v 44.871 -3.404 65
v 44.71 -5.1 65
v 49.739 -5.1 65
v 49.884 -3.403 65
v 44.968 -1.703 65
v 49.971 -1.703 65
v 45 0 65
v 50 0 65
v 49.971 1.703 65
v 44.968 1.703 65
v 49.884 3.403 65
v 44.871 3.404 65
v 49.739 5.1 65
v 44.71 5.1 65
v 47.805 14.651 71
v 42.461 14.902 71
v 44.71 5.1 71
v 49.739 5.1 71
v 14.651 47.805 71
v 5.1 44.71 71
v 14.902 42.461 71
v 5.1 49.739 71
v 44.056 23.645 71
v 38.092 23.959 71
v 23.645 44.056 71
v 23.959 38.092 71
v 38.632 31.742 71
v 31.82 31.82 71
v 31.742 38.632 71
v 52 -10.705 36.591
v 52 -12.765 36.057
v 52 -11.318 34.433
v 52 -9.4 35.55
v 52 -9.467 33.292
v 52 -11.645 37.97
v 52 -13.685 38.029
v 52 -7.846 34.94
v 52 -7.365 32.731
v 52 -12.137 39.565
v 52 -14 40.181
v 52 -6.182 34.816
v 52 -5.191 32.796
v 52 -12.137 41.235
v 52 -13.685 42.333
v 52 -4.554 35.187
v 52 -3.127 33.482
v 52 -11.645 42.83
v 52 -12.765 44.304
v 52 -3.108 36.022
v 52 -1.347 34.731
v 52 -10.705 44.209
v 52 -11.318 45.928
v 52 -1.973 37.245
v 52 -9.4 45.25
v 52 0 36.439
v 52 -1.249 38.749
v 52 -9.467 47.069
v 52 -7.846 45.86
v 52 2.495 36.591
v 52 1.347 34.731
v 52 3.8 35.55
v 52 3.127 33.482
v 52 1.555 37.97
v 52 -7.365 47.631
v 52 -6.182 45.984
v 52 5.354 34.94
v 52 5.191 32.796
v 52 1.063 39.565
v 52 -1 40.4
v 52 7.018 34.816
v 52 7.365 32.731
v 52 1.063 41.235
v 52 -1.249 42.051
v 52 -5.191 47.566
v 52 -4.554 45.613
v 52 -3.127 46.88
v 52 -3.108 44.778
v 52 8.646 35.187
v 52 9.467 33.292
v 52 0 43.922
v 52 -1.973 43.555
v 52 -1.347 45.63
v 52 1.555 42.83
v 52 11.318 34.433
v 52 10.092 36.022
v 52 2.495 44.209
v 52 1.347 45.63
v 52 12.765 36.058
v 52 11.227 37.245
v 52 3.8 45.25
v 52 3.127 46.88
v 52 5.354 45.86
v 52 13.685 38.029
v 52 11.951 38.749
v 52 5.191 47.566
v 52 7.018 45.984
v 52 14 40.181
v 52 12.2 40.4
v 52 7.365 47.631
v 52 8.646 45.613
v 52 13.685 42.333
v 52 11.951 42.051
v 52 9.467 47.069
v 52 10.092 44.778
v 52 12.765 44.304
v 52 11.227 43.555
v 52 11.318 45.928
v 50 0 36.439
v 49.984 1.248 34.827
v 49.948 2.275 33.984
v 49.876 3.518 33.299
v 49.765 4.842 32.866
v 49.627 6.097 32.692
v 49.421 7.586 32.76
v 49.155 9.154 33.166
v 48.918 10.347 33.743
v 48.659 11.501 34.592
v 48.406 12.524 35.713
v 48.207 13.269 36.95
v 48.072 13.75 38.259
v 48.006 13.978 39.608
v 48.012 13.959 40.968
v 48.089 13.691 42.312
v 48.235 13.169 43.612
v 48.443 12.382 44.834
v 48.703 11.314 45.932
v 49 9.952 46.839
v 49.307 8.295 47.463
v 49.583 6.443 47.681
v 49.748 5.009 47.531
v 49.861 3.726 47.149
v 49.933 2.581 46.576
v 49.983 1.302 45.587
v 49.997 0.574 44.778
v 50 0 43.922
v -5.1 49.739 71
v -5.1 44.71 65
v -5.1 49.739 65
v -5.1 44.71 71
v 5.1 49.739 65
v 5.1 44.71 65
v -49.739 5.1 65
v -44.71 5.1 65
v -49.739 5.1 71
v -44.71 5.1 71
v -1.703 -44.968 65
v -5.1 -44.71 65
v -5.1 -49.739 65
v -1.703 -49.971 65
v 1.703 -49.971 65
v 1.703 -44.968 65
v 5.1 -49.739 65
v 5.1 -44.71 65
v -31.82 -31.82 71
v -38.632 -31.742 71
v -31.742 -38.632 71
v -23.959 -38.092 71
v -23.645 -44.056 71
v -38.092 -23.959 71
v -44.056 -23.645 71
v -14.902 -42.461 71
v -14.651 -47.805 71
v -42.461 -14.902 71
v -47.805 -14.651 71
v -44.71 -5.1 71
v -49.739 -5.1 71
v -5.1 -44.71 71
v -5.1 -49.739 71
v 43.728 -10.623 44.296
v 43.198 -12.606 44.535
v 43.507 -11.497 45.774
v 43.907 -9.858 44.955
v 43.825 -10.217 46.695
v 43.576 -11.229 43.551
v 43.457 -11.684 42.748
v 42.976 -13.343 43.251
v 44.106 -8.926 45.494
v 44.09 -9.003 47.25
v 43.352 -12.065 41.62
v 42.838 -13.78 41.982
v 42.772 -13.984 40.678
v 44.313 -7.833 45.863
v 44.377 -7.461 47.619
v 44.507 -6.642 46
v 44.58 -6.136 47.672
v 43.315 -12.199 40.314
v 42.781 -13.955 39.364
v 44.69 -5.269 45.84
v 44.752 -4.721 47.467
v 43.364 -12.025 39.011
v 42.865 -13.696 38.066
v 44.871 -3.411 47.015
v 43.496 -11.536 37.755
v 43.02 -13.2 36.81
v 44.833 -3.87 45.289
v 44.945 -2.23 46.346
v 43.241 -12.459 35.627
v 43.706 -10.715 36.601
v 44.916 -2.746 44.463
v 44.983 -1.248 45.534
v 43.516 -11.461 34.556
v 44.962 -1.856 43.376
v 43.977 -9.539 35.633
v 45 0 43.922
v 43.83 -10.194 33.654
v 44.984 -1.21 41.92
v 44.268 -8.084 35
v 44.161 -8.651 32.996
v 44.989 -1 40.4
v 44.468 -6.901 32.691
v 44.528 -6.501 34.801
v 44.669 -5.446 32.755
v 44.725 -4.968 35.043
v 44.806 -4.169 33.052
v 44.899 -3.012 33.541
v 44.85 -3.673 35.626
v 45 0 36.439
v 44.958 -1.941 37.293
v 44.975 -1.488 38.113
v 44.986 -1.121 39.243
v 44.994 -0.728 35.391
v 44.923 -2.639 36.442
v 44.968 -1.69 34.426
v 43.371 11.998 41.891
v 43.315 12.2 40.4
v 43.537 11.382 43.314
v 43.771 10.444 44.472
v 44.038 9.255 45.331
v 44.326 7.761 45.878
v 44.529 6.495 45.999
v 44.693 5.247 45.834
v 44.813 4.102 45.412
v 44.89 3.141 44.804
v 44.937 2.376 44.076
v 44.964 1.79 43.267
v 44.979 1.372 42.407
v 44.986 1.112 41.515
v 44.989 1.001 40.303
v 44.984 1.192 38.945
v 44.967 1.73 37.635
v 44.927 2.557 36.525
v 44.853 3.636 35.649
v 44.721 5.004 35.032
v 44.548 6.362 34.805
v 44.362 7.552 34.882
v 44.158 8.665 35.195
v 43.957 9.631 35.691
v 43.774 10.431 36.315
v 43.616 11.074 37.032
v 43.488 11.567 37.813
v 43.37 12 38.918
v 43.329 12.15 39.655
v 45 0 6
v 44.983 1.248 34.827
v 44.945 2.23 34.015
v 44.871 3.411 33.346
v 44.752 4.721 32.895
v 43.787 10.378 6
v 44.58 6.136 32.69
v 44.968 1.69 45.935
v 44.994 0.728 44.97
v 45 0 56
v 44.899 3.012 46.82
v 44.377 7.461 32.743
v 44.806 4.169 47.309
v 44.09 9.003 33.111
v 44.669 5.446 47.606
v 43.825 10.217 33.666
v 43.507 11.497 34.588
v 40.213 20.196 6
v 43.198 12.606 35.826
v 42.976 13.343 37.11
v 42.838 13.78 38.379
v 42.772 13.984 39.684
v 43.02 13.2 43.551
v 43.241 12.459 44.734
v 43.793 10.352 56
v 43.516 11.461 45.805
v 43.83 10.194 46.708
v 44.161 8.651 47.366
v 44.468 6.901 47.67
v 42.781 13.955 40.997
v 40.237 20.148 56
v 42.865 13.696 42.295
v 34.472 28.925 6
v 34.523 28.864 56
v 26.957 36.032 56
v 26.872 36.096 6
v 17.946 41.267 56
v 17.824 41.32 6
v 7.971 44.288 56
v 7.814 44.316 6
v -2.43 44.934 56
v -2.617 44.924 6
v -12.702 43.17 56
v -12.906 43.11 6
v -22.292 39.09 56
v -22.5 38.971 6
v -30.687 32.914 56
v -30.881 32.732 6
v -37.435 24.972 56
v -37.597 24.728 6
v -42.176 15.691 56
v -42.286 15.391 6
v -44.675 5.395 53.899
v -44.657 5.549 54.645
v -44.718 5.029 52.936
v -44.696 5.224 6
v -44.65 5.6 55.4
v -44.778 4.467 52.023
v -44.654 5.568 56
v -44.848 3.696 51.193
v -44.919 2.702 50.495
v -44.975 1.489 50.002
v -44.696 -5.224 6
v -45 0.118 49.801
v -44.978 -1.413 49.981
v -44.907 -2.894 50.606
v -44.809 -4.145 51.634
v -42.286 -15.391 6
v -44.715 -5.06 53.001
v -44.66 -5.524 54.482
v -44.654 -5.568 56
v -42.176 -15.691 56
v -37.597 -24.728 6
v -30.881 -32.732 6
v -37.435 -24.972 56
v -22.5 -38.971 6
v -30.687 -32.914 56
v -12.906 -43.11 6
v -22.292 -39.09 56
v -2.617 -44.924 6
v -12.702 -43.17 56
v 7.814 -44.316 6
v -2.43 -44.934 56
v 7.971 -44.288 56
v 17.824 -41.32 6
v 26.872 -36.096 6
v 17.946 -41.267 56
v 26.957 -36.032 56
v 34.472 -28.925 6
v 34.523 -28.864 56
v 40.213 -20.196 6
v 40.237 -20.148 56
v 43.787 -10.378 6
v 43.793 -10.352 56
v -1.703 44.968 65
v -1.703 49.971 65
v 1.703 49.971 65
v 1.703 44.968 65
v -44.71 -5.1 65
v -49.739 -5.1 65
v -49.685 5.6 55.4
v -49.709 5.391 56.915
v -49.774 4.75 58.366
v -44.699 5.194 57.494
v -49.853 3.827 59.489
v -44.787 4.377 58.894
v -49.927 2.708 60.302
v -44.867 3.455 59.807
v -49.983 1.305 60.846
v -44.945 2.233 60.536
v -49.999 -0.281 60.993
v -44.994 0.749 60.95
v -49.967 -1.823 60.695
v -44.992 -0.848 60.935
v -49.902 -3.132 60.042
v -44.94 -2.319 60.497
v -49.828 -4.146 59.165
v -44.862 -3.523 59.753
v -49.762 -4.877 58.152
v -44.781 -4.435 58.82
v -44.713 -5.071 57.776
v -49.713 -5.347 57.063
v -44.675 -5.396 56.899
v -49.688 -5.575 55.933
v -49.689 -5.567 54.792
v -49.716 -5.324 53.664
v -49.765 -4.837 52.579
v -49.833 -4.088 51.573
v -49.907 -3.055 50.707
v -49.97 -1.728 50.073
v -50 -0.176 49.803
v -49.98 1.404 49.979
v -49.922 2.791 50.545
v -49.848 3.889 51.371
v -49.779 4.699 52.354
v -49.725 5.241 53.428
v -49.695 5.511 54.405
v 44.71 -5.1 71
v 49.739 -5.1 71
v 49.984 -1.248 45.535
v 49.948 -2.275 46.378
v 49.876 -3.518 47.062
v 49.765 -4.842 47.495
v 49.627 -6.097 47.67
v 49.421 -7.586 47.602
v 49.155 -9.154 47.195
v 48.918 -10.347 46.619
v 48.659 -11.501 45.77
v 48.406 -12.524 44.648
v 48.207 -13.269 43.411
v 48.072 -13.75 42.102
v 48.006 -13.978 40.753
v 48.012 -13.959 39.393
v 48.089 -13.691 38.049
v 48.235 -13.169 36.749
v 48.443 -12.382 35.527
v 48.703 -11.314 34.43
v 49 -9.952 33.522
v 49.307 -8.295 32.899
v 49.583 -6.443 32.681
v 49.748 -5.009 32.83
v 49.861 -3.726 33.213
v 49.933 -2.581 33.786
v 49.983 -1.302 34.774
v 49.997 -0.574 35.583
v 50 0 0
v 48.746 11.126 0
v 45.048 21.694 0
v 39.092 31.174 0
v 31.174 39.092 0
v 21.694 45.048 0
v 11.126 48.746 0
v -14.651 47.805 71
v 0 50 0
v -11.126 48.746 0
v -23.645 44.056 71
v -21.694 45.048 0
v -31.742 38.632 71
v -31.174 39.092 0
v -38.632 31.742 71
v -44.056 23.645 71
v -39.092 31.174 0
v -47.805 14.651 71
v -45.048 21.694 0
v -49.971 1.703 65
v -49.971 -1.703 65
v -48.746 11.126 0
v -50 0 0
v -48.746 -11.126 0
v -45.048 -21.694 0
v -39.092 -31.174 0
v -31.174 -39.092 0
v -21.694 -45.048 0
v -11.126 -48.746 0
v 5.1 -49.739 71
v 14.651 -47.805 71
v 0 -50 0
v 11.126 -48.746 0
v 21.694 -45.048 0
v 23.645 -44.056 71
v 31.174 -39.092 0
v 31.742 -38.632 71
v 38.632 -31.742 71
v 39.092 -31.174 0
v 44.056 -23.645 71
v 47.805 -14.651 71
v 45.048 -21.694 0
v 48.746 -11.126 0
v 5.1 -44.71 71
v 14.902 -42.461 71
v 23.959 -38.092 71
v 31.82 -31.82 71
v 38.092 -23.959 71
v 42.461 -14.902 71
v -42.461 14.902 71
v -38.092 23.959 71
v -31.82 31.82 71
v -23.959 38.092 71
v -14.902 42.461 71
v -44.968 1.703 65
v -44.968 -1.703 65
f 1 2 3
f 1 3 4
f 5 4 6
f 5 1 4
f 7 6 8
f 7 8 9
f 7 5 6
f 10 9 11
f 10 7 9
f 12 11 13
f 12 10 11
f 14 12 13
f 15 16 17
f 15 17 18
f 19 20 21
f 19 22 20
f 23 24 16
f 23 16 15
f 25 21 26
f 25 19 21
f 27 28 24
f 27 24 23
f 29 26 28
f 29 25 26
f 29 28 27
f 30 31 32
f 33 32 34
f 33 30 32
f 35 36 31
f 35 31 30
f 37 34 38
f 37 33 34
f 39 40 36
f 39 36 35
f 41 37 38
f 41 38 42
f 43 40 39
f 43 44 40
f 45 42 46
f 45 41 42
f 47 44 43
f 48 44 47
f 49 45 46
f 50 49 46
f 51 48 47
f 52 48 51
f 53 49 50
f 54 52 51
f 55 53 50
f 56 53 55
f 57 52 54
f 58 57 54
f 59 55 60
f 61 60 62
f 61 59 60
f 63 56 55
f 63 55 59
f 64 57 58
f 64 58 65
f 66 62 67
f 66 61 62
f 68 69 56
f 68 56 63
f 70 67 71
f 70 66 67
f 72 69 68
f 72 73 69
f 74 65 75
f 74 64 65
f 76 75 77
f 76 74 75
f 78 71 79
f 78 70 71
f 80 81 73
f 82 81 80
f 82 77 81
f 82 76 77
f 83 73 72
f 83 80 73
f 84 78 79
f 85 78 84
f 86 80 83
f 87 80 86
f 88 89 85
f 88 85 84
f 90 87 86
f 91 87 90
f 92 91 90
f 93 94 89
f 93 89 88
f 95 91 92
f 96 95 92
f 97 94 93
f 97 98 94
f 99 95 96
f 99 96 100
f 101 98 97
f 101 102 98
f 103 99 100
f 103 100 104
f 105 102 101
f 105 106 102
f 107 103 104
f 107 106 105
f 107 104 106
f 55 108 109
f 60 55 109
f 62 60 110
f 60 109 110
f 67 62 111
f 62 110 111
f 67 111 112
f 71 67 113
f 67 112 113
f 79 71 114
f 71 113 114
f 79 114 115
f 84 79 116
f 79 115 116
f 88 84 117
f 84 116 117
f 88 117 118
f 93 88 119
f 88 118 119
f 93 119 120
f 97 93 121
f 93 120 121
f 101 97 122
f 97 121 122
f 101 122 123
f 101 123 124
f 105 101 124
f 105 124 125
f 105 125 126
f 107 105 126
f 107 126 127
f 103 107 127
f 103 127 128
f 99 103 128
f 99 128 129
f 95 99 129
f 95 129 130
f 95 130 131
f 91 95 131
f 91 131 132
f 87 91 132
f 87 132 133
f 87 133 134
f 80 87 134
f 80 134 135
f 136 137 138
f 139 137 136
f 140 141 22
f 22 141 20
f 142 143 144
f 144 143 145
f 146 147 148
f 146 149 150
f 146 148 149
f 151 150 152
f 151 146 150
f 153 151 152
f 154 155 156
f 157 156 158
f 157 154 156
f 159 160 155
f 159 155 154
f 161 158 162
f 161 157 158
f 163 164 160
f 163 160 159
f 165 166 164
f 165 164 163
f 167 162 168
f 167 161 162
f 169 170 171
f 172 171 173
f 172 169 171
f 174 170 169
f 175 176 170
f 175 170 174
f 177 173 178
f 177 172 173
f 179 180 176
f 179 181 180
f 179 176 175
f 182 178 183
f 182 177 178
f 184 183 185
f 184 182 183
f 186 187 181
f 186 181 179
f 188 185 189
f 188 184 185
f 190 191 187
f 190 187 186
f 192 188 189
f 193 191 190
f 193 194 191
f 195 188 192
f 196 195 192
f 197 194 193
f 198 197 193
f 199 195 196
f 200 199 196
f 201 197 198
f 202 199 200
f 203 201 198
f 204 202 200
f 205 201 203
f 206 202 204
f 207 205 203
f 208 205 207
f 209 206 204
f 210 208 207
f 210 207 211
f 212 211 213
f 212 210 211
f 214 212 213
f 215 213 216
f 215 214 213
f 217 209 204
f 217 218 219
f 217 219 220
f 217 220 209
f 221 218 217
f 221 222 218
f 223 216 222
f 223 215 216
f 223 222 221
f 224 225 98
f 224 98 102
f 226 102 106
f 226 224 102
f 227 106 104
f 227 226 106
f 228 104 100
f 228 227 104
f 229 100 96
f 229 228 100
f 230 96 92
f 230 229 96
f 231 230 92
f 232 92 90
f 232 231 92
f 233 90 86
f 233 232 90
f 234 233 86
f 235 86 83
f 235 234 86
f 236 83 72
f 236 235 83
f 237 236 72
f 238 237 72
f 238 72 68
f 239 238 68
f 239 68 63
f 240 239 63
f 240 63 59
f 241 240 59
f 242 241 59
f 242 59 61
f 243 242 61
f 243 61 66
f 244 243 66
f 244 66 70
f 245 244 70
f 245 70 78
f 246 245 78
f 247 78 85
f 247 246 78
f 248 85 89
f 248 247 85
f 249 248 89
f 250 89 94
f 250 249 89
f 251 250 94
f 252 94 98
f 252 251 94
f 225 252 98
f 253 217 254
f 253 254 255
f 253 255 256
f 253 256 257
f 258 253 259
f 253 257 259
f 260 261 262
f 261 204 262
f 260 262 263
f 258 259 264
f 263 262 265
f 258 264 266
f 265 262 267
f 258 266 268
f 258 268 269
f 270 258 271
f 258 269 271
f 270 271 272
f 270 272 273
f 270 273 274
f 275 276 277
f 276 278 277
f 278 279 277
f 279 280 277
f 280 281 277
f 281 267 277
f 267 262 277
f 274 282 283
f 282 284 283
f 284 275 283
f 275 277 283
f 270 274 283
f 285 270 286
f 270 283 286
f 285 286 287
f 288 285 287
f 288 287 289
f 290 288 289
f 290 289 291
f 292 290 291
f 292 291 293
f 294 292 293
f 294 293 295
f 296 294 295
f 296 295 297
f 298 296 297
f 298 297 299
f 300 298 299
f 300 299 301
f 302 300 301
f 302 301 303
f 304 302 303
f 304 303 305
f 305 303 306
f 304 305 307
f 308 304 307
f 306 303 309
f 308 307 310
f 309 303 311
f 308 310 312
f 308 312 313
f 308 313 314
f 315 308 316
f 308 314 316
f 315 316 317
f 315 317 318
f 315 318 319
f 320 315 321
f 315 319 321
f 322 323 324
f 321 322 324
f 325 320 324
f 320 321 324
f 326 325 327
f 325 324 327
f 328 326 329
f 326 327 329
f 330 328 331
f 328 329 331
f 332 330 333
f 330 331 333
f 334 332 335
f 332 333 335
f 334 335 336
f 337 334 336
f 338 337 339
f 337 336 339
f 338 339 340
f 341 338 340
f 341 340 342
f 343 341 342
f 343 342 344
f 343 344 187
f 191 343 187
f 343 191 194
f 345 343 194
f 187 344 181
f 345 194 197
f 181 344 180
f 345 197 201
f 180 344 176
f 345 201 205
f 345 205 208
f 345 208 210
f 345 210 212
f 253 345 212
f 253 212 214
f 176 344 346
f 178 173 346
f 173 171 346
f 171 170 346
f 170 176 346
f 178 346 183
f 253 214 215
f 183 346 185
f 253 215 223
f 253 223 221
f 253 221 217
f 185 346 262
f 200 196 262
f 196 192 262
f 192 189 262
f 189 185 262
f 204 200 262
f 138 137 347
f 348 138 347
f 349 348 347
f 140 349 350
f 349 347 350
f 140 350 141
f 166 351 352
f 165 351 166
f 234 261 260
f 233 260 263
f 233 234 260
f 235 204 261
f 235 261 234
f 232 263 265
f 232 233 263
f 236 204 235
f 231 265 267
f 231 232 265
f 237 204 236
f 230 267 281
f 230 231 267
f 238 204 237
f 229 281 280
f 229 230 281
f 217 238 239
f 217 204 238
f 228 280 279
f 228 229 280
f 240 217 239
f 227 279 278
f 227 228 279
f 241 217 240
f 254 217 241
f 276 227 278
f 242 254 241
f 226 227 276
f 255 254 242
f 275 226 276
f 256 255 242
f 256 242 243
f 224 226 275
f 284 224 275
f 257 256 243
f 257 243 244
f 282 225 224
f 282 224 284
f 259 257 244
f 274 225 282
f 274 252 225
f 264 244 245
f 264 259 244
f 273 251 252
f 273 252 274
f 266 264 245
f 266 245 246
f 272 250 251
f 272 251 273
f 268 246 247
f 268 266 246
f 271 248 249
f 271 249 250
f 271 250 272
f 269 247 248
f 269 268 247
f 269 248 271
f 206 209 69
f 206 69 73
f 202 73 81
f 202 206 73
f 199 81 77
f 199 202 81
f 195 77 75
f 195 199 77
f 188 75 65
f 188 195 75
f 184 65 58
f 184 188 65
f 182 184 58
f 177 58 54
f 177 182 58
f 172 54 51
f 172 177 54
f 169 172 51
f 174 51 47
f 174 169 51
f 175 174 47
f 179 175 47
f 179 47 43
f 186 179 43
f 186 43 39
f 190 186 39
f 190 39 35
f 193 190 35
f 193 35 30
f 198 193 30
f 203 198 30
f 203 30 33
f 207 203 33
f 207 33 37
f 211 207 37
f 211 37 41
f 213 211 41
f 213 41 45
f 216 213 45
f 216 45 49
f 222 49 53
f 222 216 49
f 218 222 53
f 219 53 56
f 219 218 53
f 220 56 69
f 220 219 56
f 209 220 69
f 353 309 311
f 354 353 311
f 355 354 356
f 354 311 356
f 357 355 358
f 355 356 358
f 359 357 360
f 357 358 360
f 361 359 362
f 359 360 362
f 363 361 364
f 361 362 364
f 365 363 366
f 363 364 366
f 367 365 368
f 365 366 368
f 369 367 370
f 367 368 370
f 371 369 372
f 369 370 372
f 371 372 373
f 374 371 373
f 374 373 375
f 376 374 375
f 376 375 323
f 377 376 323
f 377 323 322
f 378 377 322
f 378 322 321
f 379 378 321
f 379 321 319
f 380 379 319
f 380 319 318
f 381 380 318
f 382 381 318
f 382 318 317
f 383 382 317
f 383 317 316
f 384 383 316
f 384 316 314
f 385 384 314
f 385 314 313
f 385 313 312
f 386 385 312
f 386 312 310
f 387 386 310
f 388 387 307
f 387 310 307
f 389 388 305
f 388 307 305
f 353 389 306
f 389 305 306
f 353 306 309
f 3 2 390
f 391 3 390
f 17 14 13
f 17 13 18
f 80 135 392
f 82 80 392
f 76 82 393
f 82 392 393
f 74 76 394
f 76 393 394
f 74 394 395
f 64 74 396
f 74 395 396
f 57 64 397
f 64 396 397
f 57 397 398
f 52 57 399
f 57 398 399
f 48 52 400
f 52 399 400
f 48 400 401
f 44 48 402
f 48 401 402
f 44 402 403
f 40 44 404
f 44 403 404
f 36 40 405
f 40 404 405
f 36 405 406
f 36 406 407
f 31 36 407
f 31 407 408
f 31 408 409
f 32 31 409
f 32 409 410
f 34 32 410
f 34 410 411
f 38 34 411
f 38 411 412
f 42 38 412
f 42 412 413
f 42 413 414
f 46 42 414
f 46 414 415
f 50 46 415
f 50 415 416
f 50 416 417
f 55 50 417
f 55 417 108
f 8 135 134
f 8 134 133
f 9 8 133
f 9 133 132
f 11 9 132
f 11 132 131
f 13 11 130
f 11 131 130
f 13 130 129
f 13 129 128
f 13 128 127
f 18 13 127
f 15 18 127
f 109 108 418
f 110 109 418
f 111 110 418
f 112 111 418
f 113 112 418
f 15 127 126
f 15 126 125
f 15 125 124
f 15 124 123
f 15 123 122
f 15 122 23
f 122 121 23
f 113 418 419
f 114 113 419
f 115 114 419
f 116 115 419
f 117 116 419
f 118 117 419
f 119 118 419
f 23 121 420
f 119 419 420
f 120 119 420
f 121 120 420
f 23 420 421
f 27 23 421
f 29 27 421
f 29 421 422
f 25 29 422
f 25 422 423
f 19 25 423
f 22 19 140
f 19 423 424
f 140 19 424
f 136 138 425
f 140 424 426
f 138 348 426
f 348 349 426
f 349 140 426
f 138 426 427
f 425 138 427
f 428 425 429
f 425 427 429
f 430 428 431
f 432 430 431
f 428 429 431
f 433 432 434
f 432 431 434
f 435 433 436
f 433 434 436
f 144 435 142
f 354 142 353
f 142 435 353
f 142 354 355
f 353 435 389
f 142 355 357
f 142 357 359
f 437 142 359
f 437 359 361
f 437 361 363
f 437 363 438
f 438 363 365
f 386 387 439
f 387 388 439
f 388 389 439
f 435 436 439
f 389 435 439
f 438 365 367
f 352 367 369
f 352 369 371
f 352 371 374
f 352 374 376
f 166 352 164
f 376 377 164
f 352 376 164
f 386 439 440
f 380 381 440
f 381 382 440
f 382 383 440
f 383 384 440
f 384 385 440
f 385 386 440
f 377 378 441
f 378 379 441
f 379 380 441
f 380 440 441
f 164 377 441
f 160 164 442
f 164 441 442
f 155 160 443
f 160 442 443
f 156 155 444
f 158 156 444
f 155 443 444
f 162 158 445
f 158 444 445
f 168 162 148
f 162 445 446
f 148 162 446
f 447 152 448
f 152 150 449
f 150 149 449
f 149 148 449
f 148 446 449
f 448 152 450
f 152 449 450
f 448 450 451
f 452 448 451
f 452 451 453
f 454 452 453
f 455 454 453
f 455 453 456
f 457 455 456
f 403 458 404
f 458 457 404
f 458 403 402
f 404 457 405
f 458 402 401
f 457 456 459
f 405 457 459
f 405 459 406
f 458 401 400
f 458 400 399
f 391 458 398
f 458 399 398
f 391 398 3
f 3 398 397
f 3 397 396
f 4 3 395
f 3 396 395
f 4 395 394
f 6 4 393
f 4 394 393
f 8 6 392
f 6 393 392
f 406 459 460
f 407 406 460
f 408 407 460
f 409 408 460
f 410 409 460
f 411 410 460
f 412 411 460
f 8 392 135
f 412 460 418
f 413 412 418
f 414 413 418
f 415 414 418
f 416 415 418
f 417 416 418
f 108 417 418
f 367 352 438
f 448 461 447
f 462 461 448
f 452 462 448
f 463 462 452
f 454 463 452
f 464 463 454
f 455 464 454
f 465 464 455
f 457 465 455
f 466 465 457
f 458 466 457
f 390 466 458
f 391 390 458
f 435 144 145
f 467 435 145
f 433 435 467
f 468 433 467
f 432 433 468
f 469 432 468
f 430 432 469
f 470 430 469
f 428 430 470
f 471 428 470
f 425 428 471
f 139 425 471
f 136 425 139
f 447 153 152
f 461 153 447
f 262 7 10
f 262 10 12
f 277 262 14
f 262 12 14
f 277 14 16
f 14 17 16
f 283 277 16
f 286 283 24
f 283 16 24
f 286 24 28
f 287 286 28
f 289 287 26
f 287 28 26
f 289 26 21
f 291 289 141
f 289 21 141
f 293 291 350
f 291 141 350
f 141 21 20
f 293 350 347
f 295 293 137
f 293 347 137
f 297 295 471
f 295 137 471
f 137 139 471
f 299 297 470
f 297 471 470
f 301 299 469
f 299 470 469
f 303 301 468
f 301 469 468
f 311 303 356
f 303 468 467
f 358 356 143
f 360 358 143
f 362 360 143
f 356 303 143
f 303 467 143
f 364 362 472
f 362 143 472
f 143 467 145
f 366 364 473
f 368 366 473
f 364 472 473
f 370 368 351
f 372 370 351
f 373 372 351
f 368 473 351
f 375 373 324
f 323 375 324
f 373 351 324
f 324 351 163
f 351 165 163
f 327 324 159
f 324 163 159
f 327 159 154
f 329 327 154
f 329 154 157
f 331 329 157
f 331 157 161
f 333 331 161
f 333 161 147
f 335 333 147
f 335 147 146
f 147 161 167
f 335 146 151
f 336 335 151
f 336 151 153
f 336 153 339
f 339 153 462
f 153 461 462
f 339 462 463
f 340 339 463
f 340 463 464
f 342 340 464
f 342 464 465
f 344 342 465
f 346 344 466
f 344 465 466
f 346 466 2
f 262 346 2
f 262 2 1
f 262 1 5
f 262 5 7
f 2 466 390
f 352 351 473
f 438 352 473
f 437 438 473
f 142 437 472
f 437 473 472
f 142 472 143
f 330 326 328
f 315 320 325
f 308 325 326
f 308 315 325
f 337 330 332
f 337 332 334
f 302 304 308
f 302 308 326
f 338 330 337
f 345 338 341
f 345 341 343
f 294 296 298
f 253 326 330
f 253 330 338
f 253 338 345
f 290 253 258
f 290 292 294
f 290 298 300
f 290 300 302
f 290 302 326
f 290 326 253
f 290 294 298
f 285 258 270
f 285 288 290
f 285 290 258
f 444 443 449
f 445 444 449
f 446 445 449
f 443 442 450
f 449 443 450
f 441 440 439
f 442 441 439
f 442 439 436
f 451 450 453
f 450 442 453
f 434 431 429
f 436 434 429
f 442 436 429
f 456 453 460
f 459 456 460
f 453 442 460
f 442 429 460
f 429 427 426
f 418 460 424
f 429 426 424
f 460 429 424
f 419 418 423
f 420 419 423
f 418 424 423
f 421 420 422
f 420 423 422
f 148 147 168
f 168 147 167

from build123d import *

# Parameters (mm, degrees)
F0_R      = 50
F1_DEPTH  = 71
F2_R      = 45
F3_DEPTH  = 65
F4_W      = 10.2
F4_H      = 6
F5_DEPTH  = 50
F6_W      = 10.2
F6_H      = 6
F7_DEPTH  = 50
F8_W      = 10.2
F8_H      = 6
F9_DEPTH  = 50
F10_W     = 10.2
F10_H     = 6
F11_DEPTH = 50
F12_R     = 5.6
F13_DEPTH = 55
F14_R     = 5.6
F15_DEPTH = 56
F17_DEPTH = 52
F18_DEPTH = 55
F19_R     = 45
F20_DEPTH = 50


with BuildPart() as f1:
    # F0 (on Top) → F1 (new body)
    with BuildSketch(Plane.XY):
        Circle(F0_R)
    extrude(amount=F1_DEPTH)

    # F2 (on face) → F3 (cut)
    with BuildSketch(Plane.XY.offset(71)):
        Circle(F2_R)
    extrude(amount=-F3_DEPTH, mode=Mode.SUBTRACT)

    # F4 (on Front) → F5 (cut)
    with BuildSketch(Plane.XZ):
        with Locations((0, 68)):
            Rectangle(F4_W, F4_H)
    extrude(amount=-F5_DEPTH, mode=Mode.SUBTRACT)

    # F6 (on Front) → F7 (cut)
    with BuildSketch(Plane.XZ):
        with Locations((0, 68)):
            Rectangle(F6_W, F6_H)
    extrude(amount=F7_DEPTH, mode=Mode.SUBTRACT)

    # F8 (on Right) → F9 (cut)
    with BuildSketch(Plane.YZ):
        with Locations((0, 68)):
            Rectangle(F8_W, F8_H)
    extrude(amount=-F9_DEPTH, mode=Mode.SUBTRACT)

    # F10 (on Right) → F11 (cut)
    with BuildSketch(Plane.YZ):
        with Locations((0, 68)):
            Rectangle(F10_W, F10_H)
    extrude(amount=F11_DEPTH, mode=Mode.SUBTRACT)

    # F12 (on Right) → F13 (cut)
    with BuildSketch(Plane.YZ):
        with Locations((0, 55.4)):
            Circle(F12_R)
    extrude(amount=-F13_DEPTH, mode=Mode.SUBTRACT)

    # F14 (on Right) → F15 (cut)
    with BuildSketch(Plane.YZ):
        with Locations((-6.6, 40.4)):
            Circle(F14_R)
        with Locations((6.6, 40.4)):
            Circle(F14_R)
    extrude(amount=F15_DEPTH, mode=Mode.SUBTRACT)

    # F16 (on Right) → F17 (join)
    with BuildSketch(Plane.YZ):
        with BuildLine():
            ThreePointArc((2.6579e-05, 36.4390160432), (0.7456952511, 38.2441613187), (1, 40.1806272566))
            ThreePointArc((1, 40.1806272566), (0.7456814951, 42.1171446646), (-2.6579e-05, 43.922330816))
            ThreePointArc((-2.6579e-05, 43.922330816), (-0.9999999998, 40.1806663261), (2.6579e-05, 36.4390160432))
        make_face()
        with BuildLine():
            ThreePointArc((-2.6579e-05, 43.922330816), (0.7456814951, 42.1171446646), (1, 40.1806272566))
            ThreePointArc((1, 40.1806272566), (0.7456952511, 38.2441613187), (2.6579e-05, 36.4390160432))
            ThreePointArc((2.6579e-05, 36.4390160432), (8.4365174079, 32.9350381074), (14, 40.1807196026))
            ThreePointArc((14, 40.1807196026), (8.4364659379, 47.4264148536), (-2.6579e-05, 43.922330816))
        make_face()
        with BuildLine():
            ThreePointArc((2.6579e-05, 36.4390160432), (-0.9999999998, 40.1806663261), (-2.6579e-05, 43.922330816))
            ThreePointArc((-2.6579e-05, 43.922330816), (-13.9999999998, 40.1805739801), (2.6579e-05, 36.4390160432))
        make_face()
    extrude(amount=F17_DEPTH)

    # F14 (on Right) → F18 (cut)
    with BuildSketch(Plane.YZ):
        with Locations((-6.6, 40.4)):
            Circle(F14_R)
        with Locations((6.6, 40.4)):
            Circle(F14_R)
    extrude(amount=F18_DEPTH, mode=Mode.SUBTRACT)

    # F19 (on face) → F20 (cut)
    with BuildSketch(Plane.XY.offset(6)):
        Circle(F19_R)
    extrude(amount=F20_DEPTH, mode=Mode.SUBTRACT)


solid = f1.part
